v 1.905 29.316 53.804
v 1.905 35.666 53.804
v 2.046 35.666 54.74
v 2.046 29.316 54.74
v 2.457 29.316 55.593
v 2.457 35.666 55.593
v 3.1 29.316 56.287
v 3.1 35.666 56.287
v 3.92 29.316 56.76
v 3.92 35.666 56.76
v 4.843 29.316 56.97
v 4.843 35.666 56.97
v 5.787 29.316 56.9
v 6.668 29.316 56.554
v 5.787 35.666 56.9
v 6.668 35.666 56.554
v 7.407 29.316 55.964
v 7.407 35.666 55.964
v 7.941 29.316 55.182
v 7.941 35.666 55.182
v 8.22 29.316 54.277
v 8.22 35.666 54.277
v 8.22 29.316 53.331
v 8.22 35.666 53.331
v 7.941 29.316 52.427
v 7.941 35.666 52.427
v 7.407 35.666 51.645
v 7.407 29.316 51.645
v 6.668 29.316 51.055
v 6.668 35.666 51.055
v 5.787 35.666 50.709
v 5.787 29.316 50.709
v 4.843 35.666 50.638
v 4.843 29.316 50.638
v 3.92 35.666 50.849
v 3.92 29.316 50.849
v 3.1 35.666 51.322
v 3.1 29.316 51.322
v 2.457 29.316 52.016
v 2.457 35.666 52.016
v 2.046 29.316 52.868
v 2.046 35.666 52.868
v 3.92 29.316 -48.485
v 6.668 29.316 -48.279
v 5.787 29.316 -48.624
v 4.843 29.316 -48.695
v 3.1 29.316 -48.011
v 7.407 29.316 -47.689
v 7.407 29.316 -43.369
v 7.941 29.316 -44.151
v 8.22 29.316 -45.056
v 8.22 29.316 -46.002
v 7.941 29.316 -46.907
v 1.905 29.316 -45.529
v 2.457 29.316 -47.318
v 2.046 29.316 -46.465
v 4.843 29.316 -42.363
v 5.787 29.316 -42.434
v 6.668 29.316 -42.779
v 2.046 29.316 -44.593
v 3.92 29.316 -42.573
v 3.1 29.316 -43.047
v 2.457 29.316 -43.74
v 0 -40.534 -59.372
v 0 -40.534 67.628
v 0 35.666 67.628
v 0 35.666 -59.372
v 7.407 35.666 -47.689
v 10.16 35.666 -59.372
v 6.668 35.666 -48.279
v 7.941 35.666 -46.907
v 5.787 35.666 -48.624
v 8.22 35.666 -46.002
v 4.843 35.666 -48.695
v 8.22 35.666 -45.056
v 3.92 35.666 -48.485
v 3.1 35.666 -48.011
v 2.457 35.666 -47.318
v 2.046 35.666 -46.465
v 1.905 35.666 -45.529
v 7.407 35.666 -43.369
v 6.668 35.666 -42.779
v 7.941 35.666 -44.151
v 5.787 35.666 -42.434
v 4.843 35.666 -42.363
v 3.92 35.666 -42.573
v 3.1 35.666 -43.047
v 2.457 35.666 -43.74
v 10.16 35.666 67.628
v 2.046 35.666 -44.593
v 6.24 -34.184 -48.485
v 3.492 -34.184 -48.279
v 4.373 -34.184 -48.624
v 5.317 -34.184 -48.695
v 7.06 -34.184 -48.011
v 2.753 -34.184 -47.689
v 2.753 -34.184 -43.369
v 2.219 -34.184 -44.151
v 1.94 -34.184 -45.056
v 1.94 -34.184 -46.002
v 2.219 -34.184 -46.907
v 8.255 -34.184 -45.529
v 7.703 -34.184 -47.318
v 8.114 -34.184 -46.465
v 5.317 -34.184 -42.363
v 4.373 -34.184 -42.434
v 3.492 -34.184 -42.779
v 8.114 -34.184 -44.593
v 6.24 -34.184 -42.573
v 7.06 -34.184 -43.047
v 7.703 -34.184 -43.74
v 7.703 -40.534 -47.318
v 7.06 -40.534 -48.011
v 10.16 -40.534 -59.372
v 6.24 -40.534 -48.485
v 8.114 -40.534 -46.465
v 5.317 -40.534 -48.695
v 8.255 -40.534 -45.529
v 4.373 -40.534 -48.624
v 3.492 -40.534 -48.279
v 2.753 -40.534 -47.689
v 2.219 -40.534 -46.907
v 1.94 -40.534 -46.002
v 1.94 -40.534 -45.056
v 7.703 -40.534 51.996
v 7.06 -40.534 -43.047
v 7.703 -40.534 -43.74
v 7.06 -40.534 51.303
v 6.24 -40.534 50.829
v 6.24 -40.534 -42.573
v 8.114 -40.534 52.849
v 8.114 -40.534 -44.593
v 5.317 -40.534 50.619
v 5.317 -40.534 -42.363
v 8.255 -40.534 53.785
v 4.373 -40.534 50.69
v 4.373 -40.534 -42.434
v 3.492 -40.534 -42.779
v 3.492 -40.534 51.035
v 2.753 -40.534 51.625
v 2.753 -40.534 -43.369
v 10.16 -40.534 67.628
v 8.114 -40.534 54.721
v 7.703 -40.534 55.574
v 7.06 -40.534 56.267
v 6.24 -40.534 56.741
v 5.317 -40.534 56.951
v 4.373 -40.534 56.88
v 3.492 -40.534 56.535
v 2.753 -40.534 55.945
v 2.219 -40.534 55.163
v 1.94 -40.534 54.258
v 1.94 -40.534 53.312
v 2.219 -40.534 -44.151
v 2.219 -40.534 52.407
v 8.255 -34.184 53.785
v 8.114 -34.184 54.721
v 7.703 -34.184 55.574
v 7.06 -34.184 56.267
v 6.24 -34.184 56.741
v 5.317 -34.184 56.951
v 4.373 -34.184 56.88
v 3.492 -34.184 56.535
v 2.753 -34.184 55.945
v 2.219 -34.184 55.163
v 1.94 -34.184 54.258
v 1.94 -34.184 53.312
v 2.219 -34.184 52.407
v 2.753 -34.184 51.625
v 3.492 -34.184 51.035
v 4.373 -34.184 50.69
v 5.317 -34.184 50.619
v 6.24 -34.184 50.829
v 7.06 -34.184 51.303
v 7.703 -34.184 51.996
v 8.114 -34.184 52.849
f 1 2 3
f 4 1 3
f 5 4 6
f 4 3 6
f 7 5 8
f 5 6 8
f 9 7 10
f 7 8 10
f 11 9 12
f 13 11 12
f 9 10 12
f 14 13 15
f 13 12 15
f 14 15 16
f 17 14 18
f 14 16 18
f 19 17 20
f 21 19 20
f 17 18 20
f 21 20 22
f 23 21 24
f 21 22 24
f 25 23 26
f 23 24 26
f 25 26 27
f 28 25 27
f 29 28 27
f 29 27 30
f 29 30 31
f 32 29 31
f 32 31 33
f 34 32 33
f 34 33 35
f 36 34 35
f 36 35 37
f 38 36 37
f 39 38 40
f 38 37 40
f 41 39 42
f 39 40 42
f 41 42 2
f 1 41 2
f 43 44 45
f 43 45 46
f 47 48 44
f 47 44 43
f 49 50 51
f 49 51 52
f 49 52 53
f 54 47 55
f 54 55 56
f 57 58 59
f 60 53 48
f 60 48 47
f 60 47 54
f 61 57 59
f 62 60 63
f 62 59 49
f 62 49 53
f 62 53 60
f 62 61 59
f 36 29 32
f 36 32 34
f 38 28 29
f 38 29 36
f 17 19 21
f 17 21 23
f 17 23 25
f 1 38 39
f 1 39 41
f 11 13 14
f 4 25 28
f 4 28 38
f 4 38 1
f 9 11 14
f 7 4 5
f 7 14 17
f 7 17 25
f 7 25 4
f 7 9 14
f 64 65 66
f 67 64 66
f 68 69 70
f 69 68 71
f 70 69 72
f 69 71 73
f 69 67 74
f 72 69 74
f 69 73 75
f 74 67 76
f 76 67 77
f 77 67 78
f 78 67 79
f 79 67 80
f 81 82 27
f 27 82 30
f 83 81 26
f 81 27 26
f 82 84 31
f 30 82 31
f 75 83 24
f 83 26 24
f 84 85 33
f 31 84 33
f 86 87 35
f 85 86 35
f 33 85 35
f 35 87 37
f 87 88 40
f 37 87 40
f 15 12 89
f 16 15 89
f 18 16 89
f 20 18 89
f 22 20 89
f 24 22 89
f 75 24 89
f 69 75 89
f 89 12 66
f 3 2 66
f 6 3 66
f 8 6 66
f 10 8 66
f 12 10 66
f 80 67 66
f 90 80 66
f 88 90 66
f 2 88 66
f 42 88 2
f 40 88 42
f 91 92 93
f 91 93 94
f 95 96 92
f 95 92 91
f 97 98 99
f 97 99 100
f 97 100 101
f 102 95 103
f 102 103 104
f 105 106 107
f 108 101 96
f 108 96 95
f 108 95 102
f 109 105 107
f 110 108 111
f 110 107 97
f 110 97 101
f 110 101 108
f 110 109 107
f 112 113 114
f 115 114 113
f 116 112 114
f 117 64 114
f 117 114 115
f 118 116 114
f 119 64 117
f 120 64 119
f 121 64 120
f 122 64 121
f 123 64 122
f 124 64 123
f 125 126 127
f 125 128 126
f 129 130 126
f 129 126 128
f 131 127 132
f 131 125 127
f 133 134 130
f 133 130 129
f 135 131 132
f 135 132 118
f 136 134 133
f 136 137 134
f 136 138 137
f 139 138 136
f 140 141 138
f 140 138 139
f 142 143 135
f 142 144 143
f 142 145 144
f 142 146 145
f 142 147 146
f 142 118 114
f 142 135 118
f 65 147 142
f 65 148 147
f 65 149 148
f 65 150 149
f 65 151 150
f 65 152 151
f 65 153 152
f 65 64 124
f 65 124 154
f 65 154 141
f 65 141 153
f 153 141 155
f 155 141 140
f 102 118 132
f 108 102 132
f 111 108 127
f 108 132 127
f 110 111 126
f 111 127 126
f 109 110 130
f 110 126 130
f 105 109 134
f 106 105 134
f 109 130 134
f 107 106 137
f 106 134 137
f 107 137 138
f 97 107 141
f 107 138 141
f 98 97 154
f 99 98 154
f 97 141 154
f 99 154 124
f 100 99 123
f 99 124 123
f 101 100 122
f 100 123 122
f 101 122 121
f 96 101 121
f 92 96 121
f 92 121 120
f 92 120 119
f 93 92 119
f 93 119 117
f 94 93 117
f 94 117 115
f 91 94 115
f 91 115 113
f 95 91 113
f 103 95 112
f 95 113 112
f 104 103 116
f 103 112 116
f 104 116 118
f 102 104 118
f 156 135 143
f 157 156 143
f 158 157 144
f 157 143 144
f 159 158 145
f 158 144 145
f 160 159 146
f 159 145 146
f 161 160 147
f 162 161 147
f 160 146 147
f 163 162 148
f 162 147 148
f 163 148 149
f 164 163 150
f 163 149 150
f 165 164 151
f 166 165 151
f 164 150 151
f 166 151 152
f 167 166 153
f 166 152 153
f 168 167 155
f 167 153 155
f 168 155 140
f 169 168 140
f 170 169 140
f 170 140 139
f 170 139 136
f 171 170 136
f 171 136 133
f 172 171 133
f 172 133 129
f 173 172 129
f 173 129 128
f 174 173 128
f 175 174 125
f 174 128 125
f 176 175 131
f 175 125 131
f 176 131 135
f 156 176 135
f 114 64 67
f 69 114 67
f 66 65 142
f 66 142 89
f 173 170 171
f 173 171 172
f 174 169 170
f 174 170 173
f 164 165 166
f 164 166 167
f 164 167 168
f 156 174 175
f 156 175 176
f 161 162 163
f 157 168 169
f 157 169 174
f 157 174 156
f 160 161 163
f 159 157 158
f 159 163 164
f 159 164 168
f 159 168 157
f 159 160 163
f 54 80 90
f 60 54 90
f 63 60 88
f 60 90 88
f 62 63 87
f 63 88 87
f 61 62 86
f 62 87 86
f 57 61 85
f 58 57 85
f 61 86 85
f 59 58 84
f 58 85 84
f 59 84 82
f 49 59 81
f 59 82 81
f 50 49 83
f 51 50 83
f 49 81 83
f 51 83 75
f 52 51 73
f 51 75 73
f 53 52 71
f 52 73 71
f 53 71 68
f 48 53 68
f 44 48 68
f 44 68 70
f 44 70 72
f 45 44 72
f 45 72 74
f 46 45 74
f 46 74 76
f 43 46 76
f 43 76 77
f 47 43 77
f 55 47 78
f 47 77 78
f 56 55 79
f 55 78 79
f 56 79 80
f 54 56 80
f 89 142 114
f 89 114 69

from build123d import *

# Parameters (mm, degrees)
F0_W     = 76.2
F0_H     = 127
F1_DEPTH = 10.16
F2_R     = 3.175
F3_DEPTH = 6.35
F4_DEPTH = 6.35
F5_R     = 3.175
F6_DEPTH = 6.35


with BuildPart() as f1:
    # F0 (on Right) → F1 (new body)
    with BuildSketch(Plane.YZ):
        with Locations((-2.434241, 4.128012)):
            Rectangle(F0_W, F0_H)
    extrude(amount=F1_DEPTH)

    # F2 (on face) → F3 (cut)
    with BuildSketch(Plane.XZ.offset(40.534241)):
        with Locations((5.08, -45.528988)):
            Circle(F2_R)
    extrude(amount=-F3_DEPTH, mode=Mode.SUBTRACT)

    # F2 (on face) → F4 (cut)
    with BuildSketch(Plane.XZ.offset(40.534241)):
        with Locations((5.08, 53.785012)):
            Circle(F2_R)
    extrude(amount=-F4_DEPTH, mode=Mode.SUBTRACT)

    # F5 (on face) → F6 (cut)
    with BuildSketch(Plane(origin=(0, 35.665759, 0), x_dir=(-1, 0, 0), z_dir=(0, 1, 0))):
        with Locations((-5.08, 53.804278)):
            Circle(F5_R)
        with Locations((-5.08, -45.528988)):
            Circle(F5_R)
    extrude(amount=-F6_DEPTH, mode=Mode.SUBTRACT)


solid = f1.part
